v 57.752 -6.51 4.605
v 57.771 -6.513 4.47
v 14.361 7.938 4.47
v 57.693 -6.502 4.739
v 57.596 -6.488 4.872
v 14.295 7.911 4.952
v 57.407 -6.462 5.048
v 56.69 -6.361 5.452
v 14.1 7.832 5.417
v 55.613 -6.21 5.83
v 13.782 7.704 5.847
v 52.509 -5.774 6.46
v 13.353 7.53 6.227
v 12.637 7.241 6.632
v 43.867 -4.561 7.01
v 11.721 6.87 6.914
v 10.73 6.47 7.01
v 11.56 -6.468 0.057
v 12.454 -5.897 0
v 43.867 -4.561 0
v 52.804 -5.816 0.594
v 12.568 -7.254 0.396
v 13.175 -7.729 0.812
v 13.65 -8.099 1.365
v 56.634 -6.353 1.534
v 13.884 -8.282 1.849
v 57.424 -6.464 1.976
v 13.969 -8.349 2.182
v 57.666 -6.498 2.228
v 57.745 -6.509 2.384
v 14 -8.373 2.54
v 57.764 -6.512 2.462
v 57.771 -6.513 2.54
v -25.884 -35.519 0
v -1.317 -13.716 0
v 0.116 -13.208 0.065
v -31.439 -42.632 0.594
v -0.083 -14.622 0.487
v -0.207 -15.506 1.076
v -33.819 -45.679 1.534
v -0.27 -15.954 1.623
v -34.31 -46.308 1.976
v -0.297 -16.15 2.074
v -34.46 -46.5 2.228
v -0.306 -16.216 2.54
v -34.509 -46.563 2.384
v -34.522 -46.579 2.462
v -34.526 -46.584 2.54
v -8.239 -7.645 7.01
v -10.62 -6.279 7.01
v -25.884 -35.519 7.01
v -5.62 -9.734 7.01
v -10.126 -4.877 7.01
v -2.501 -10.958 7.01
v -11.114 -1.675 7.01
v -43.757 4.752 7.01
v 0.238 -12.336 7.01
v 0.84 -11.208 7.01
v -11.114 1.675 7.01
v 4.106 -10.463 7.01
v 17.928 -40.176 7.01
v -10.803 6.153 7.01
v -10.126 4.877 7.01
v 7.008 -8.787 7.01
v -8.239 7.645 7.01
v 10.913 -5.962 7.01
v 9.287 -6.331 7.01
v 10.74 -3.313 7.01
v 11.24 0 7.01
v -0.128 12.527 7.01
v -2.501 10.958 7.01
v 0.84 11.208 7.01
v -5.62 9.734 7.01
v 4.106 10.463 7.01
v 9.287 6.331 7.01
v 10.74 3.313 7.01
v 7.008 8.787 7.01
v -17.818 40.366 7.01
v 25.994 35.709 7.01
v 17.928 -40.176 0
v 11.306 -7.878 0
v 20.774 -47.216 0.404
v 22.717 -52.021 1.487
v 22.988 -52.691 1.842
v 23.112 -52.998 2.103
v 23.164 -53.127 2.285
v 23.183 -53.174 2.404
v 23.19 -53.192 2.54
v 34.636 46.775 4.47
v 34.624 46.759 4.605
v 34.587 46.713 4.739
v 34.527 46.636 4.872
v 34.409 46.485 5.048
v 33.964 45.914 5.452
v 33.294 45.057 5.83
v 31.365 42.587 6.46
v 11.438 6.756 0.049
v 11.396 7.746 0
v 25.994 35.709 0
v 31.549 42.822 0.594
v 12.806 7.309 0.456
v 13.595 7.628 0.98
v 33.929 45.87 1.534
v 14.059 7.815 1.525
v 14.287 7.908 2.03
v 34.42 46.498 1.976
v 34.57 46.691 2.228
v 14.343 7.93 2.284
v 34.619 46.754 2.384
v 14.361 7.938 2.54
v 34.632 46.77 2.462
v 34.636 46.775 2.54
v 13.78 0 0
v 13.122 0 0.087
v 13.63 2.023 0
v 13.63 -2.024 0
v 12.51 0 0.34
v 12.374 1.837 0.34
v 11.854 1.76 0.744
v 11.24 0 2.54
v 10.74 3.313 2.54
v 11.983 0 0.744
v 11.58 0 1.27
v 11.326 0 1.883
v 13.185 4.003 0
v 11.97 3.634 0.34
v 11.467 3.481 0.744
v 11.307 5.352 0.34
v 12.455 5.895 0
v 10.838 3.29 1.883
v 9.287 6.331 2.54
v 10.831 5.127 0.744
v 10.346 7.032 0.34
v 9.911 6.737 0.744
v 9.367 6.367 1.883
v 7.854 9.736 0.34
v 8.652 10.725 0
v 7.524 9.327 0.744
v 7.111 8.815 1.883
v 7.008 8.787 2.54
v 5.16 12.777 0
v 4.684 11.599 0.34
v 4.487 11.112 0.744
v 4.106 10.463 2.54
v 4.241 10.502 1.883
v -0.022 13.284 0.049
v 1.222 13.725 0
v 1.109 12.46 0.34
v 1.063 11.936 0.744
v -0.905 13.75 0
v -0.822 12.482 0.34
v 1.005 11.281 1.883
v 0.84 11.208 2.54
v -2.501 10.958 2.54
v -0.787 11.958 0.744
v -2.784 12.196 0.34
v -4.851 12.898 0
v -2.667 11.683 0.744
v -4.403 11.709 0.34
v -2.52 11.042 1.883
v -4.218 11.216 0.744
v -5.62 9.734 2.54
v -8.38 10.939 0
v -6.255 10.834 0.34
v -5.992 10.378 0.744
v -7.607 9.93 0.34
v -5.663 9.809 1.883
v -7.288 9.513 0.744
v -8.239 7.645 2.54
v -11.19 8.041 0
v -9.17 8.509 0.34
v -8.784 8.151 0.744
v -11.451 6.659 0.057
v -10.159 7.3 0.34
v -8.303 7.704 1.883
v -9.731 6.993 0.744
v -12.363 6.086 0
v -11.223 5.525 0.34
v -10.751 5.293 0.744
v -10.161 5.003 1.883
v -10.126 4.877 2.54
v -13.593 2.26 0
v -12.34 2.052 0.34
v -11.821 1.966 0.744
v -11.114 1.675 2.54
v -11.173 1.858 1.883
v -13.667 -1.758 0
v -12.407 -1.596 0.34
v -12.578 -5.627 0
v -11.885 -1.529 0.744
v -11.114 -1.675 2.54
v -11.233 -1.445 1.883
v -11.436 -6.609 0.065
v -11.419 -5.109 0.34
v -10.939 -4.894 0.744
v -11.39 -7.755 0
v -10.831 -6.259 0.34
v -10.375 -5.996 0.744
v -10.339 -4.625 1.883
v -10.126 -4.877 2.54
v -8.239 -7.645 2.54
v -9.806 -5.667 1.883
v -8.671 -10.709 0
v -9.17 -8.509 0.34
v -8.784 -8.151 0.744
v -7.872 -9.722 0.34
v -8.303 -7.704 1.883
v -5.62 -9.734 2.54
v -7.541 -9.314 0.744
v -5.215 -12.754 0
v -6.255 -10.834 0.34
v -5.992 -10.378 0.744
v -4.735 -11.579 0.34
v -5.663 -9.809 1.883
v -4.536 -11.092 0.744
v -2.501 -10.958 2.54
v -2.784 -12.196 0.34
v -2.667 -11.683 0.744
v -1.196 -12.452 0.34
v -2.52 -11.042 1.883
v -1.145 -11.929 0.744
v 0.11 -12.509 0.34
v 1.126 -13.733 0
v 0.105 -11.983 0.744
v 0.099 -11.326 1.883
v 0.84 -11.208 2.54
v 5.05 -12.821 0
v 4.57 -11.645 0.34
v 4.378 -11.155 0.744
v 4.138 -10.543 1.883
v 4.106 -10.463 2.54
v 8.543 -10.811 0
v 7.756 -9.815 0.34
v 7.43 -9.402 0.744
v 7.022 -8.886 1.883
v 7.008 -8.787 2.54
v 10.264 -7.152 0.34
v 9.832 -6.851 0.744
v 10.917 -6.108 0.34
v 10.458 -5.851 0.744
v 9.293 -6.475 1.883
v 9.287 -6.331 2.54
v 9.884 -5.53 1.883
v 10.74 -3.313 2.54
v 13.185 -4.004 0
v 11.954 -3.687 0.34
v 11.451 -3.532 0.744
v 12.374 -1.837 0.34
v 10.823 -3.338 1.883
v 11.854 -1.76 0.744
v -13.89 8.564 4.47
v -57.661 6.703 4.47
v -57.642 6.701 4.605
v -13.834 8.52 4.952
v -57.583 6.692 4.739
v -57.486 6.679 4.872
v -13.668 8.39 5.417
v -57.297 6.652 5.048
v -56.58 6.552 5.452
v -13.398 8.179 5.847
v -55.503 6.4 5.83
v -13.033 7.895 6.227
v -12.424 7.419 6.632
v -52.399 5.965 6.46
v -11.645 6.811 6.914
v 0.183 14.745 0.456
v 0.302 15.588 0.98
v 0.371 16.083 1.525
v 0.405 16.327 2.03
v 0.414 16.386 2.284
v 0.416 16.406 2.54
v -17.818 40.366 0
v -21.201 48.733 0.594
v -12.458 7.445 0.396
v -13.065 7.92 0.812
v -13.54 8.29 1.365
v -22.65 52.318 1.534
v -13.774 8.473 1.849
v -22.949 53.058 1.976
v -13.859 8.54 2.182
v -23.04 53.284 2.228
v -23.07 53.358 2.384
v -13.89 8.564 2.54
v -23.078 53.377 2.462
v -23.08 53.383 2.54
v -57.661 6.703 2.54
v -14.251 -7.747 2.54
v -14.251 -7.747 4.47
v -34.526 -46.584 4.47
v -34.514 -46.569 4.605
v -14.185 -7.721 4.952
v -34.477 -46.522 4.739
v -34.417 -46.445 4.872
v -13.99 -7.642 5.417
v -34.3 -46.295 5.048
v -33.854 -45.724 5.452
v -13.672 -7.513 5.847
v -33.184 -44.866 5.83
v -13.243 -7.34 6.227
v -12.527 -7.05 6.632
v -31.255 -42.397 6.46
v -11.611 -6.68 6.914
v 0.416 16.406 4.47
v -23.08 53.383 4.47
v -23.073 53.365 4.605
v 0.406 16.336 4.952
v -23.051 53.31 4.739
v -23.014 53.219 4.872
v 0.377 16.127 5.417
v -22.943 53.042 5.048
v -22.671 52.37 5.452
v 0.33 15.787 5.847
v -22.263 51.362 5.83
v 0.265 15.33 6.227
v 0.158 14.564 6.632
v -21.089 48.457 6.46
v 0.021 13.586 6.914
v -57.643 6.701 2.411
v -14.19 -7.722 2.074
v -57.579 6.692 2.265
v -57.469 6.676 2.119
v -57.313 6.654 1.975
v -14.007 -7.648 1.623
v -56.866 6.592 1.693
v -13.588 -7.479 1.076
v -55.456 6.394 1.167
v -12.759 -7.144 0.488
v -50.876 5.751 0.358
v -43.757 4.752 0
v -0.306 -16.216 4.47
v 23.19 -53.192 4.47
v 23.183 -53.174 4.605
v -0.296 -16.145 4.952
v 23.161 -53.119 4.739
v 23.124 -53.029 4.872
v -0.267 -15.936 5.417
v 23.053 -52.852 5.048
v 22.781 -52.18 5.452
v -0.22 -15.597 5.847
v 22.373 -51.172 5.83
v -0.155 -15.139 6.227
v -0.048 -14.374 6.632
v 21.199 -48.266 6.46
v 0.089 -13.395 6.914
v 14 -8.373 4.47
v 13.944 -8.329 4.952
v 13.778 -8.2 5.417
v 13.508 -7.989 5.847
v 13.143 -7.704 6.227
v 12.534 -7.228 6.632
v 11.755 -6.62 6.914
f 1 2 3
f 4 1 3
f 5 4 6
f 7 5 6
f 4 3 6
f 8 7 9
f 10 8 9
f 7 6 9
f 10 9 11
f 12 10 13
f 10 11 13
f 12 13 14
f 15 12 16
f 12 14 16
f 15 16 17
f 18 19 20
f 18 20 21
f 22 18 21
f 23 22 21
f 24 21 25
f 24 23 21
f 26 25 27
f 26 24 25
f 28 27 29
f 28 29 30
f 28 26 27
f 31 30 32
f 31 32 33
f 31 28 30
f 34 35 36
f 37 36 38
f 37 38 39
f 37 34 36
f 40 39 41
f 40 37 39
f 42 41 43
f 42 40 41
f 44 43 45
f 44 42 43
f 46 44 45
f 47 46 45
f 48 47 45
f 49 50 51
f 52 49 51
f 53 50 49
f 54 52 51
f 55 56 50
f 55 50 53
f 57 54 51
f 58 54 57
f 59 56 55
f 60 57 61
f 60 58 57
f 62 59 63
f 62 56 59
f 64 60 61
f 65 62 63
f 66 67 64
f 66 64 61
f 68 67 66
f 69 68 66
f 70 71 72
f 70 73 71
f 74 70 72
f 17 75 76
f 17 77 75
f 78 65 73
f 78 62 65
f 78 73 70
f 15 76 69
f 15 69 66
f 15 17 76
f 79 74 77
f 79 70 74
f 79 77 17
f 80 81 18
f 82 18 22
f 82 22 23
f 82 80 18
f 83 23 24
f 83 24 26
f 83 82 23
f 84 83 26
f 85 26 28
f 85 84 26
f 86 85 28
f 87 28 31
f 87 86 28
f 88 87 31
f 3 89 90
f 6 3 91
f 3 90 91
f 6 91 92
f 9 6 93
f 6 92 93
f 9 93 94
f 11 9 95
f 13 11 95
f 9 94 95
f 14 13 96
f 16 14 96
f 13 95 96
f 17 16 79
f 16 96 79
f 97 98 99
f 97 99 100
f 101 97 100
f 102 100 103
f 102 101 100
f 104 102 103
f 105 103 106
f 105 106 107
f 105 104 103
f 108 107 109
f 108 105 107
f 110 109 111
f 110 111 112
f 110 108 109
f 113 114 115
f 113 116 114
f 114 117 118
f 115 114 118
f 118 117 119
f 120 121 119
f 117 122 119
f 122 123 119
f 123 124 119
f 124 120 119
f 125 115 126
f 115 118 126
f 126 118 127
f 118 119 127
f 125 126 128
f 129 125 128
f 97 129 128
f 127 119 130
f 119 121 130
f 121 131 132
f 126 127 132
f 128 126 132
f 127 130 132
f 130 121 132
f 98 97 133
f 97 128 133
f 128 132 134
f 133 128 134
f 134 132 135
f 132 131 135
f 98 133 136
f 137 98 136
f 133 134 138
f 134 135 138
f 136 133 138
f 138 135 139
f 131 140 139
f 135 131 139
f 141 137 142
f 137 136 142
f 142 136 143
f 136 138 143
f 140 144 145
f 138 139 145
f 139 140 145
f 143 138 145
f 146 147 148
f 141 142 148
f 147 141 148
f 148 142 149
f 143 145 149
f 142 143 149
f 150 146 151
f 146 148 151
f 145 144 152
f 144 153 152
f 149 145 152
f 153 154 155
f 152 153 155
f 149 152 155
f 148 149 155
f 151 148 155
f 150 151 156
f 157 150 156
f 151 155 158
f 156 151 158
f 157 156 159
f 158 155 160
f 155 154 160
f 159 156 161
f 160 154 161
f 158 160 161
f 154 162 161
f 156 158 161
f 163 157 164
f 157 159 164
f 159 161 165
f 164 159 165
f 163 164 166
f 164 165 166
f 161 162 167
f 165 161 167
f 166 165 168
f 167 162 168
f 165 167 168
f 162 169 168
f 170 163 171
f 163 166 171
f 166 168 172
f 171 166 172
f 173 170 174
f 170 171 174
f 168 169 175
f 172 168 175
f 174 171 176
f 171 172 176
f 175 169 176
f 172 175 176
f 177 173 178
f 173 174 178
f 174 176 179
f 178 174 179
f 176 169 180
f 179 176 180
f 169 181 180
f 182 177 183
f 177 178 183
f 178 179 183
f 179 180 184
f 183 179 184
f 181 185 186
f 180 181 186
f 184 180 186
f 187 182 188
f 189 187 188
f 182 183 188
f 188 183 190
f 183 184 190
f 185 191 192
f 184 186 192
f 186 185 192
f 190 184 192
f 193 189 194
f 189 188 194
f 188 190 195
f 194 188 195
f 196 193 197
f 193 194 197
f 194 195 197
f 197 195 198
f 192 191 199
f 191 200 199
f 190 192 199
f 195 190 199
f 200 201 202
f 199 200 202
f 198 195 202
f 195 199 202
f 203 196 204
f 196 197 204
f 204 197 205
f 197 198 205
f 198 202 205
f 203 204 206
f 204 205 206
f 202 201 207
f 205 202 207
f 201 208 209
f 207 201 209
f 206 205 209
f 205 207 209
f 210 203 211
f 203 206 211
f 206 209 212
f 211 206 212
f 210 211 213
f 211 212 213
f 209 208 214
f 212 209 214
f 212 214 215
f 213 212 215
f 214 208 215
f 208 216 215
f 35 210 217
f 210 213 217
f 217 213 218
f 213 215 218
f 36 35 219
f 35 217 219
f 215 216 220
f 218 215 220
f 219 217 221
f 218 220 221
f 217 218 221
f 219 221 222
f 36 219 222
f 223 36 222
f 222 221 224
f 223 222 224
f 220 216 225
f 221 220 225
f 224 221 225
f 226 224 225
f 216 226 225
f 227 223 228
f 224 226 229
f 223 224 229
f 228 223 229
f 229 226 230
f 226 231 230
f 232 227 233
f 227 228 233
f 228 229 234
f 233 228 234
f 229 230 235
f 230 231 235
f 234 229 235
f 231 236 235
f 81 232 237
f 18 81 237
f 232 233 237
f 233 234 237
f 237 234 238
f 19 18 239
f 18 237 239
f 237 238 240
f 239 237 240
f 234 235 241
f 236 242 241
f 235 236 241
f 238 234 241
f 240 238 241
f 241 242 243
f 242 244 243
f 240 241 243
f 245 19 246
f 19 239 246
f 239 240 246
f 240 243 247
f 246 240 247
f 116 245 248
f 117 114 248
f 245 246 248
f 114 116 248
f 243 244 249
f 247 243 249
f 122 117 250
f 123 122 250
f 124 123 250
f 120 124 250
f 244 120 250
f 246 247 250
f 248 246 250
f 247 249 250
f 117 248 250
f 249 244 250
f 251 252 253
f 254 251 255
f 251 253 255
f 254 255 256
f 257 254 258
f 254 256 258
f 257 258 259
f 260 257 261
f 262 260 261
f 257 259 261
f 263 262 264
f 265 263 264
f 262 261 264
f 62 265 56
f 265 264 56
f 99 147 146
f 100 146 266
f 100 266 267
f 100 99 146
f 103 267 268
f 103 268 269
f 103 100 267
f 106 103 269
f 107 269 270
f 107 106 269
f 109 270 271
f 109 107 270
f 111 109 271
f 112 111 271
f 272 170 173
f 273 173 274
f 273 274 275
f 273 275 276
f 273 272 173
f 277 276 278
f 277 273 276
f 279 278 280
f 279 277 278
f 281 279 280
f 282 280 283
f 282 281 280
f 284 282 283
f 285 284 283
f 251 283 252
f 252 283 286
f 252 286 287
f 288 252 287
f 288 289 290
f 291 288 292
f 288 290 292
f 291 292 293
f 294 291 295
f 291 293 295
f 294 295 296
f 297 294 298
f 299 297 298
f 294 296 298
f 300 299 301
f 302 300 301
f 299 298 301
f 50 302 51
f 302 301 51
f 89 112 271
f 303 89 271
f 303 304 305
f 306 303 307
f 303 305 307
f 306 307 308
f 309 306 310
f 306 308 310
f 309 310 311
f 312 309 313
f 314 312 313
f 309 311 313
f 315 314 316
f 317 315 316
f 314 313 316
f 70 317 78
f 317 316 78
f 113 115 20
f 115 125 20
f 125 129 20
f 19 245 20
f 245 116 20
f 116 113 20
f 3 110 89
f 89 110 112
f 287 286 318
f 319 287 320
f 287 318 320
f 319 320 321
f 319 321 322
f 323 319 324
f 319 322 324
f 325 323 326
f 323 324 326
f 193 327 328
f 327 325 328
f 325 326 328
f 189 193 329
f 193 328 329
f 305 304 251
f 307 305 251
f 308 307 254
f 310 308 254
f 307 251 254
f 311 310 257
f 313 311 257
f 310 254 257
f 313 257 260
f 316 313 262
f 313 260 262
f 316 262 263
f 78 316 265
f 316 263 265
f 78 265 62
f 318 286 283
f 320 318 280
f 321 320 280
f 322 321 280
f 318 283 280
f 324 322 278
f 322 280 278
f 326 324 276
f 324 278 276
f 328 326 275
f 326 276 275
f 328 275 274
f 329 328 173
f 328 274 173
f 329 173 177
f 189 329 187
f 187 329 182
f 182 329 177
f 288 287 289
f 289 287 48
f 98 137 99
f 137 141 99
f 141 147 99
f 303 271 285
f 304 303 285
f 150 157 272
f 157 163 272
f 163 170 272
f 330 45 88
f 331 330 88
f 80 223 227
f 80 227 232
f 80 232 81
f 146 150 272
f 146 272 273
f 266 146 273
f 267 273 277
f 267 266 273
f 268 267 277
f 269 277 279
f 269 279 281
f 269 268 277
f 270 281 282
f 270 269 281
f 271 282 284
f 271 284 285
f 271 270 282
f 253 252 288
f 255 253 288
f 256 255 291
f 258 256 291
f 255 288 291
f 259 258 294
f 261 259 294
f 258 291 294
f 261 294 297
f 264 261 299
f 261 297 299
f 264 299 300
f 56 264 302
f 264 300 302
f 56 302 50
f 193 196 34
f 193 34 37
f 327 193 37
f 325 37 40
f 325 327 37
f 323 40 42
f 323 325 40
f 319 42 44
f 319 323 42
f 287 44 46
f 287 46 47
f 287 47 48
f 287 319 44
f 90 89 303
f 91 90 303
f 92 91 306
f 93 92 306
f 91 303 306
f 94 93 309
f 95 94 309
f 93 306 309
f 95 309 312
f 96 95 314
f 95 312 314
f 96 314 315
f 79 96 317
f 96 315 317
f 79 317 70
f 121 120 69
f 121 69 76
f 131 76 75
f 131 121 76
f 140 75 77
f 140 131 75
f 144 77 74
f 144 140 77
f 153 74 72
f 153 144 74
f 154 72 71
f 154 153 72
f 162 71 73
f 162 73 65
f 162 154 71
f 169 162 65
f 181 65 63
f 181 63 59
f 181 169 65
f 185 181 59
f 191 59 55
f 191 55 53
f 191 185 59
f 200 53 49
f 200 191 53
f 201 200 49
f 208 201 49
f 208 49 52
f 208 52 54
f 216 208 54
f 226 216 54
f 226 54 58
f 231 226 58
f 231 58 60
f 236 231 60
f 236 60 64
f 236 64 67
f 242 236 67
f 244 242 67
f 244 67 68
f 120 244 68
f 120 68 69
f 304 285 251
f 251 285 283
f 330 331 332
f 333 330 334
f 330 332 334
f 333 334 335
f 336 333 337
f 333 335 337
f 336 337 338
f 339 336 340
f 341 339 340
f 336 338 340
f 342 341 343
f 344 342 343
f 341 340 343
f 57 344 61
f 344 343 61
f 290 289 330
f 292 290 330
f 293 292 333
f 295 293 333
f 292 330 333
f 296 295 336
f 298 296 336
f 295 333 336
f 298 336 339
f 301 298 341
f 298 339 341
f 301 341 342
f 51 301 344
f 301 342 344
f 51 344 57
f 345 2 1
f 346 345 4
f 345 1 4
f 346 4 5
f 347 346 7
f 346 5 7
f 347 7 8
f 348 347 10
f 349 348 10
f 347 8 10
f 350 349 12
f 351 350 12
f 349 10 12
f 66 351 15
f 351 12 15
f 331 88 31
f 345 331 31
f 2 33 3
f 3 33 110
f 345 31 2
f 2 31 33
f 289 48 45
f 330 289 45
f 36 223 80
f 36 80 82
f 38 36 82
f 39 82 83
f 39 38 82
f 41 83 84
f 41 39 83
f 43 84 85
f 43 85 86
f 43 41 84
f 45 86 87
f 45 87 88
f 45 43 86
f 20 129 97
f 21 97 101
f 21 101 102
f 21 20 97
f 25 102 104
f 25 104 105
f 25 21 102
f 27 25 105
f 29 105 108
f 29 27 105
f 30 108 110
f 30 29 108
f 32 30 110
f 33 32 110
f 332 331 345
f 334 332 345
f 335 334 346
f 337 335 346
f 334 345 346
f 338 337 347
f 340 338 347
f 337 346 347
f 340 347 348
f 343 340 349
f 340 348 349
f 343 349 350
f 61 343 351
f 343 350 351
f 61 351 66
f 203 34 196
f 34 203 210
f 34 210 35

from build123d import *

# Parameters (mm, degrees)
F0_R          = 11.2395
F1_DEPTH      = 7.0104
F2_R          = 2.54
F3_T4_DEPTH   = 58.4517099093
F3_T9_DEPTH   = 56.5105690907
F3_T14_DEPTH  = 58.4517099093
F3_T19_DEPTH  = 56.5105690907
F3_T24_DEPTH  = 58.4517099093
F3_T29_DEPTH  = 56.5105690907
F3_T34_DEPTH  = 58.4517099093
F3_T39_DEPTH  = 56.5105690907
F3_T44_DEPTH  = 58.4517099093
F3_T49_DEPTH  = 56.5105690907
F3_T54_DEPTH  = 58.4517099093
F3_T59_DEPTH  = 56.5105690907
F3_T67_DEPTH  = 58.4517099093
F3_T71_DEPTH  = 56.5105690907
F3_T78_DEPTH  = 58.4517099093
F3_T82_DEPTH  = 56.5105690907
F3_T89_DEPTH  = 58.4517099093
F3_T93_DEPTH  = 56.5105690907
F3_T100_DEPTH = 58.4517099093
F3_T104_DEPTH = 56.5105690907
F3_T111_DEPTH = 58.4517099093
F3_T115_DEPTH = 56.5105690907
F3_T122_DEPTH = 56.5105690907
F3_T126_DEPTH = 58.4517099093


# Not quite as in the source:
# - a fillet or chamfer that OpenCascade refuses, or shapes differently, is made with other operations: its cross-section is extruded or revolved along the edge and cut away or added


with BuildPart() as f1:
    # F0 (on Top) → F1 (new body)
    with BuildSketch(Plane.XY):
        with BuildLine():
            ThreePointArc((14.1535943712, 7.539855096), (15.5587542777, 3.8857192152), (16.036634575, 0))
            ThreePointArc((16.036634575, 0), (15.49765005, -4.122680126), (13.91692656, -7.9682371712))
            Line((13.91692656, -7.9682371712), (13.9999523741, -8.373134936))
            Line((13.9999523741, -8.373134936), (57.7710043319, -6.5127654675))
            Line((57.7710043319, -6.5127654675), (14.3613089772, 7.9377469398))
            Line((14.3613089772, 7.9377469398), (14.1535943712, 7.539855096))
        make_face()
        with BuildLine():
            ThreePointArc((0, 16.036634575), (8.2540822497, 13.7493190635), (14.1535943712, 7.539855096))
            Line((14.1535943712, 7.539855096), (14.3613089772, 7.9377469398))
            Line((14.3613089772, 7.9377469398), (34.635707736, 46.7747746198))
            Line((34.635707736, 46.7747746198), (0.4163492162, 16.4061318757))
            Line((0.4163492162, 16.4061318757), (0, 16.036634575))
        make_face()
        with BuildLine():
            Line((13.9999523741, -8.373134936), (13.91692656, -7.9682371712))
            ThreePointArc((13.91692656, -7.9682371712), (13.7943089537, -8.1786728131), (13.6685096291, -8.387222008))
            Line((13.6685096291, -8.387222008), (13.9999523741, -8.373134936))
        make_face()
        with BuildLine():
            ThreePointArc((-13.549530457, 8.5781042712), (-7.7333603611, 14.048800163), (0, 16.036634575))
            Line((0, 16.036634575), (0.4163492162, 16.4061318757))
            Line((0.4163492162, 16.4061318757), (-23.0803039828, 53.3827900874))
            Line((-23.0803039828, 53.3827900874), (-13.8899671478, 8.563634936))
            Line((-13.8899671478, 8.563634936), (-13.549530457, 8.5781042712))
        make_face()
        with BuildLine():
            Line((13.9999523741, -8.373134936), (13.6685096291, -8.387222008))
            ThreePointArc((13.6685096291, -8.387222008), (7.7861485351, -14.0196126723), (-0.1042878985, -16.036295474))
            Line((-0.1042878985, -16.036295474), (-0.30636399, -16.2156318757))
            Line((-0.30636399, -16.2156318757), (23.190289209, -53.1922900874))
            Line((23.190289209, -53.1922900874), (13.9999523741, -8.373134936))
        make_face()
        with BuildLine():
            ThreePointArc((-13.8067270062, 8.157691945), (-13.6797438656, 8.3688862021), (-13.549530457, 8.5781042712))
            Line((-13.549530457, 8.5781042712), (-13.8899671478, 8.563634936))
            Line((-13.8899671478, 8.563634936), (-13.8067270062, 8.157691945))
        make_face()
        with BuildLine():
            Line((-0.30636399, -16.2156318757), (-0.1042878985, -16.036295474))
            ThreePointArc((-0.1042878985, -16.036295474), (-0.2639889319, -16.0344615855), (-0.4236637816, -16.0310373181))
            Line((-0.4236637816, -16.0310373181), (-0.30636399, -16.2156318757))
        make_face()
        with BuildLine():
            ThreePointArc((-14.1482702845, -7.5498408229), (-16.0328448753, 0.3486168375), (-13.8067270062, 8.157691945))
            Line((-13.8067270062, 8.157691945), (-13.8899671478, 8.563634936))
            Line((-13.8899671478, 8.563634936), (-57.6610191056, 6.7032654675))
            Line((-57.6610191056, 6.7032654675), (-14.2513237509, -7.7472469398))
            Line((-14.2513237509, -7.7472469398), (-14.1482702845, -7.5498408229))
        make_face()
        with BuildLine():
            Line((-0.30636399, -16.2156318757), (-0.4236637816, -16.0310373181))
            ThreePointArc((-0.4236637816, -16.0310373181), (-8.2924525996, -13.7262113628), (-13.9934373276, -7.8330939131))
            Line((-13.9934373276, -7.8330939131), (-14.2513237509, -7.7472469398))
            Line((-14.2513237509, -7.7472469398), (-34.5257225097, -46.5842746198))
            Line((-34.5257225097, -46.5842746198), (-0.30636399, -16.2156318757))
        make_face()
        with BuildLine():
            ThreePointArc((-13.9934373276, -7.8330939131), (-14.0715665407, -7.6918569659), (-14.1482702845, -7.5498408229))
            Line((-14.1482702845, -7.5498408229), (-14.2513237509, -7.7472469398))
            Line((-14.2513237509, -7.7472469398), (-13.9934373276, -7.8330939131))
        make_face()
        with BuildLine():
            ThreePointArc((13.91692656, -7.9682371712), (15.49765005, -4.122680126), (16.036634575, 0))
            ThreePointArc((16.036634575, 0), (15.5587542777, 3.8857192152), (14.1535943712, 7.539855096))
            ThreePointArc((14.1535943712, 7.539855096), (8.2540822497, 13.7493190635), (0, 16.036634575))
            ThreePointArc((0, 16.036634575), (-7.7333603611, 14.048800163), (-13.549530457, 8.5781042712))
            ThreePointArc((-13.549530457, 8.5781042712), (-13.6797438656, 8.3688862021), (-13.8067270062, 8.157691945))
            ThreePointArc((-13.8067270062, 8.157691945), (-16.0328448753, 0.3486168375), (-14.1482702845, -7.5498408229))
            ThreePointArc((-14.1482702845, -7.5498408229), (-14.0715665407, -7.6918569659), (-13.9934373276, -7.8330939131))
            ThreePointArc((-13.9934373276, -7.8330939131), (-8.2924525996, -13.7262113628), (-0.4236637816, -16.0310373181))
            ThreePointArc((-0.4236637816, -16.0310373181), (-0.2639889319, -16.0344615855), (-0.1042878985, -16.036295474))
            ThreePointArc((-0.1042878985, -16.036295474), (7.7861485351, -14.0196126723), (13.6685096291, -8.387222008))
            ThreePointArc((13.6685096291, -8.387222008), (13.7943089537, -8.1786728131), (13.91692656, -7.9682371712))
        make_face()
        Circle(F0_R, mode=Mode.SUBTRACT)
    extrude(amount=F1_DEPTH)

    # F2
    f2_edges = [f1.edges().sort_by_distance(p)[0] for p in [
        (36.066157, 0.712491, 7.0104),
        (24.498508, 27.356261, 7.0104),
        (17.526028, 31.590453, 7.0104),
        (-11.331977, 34.894461, 7.0104),
        (-18.485136, 30.973213, 7.0104),
        (-35.775493, 7.63345, 7.0104),
        (-35.956171, -0.521991, 7.0104),
        (-24.388523, -27.165761, 7.0104),
        (-17.416043, -31.399953, 7.0104),
        (11.441963, -34.703961, 7.0104),
        (18.595121, -30.782713, 7.0104),
        (35.885478, -7.44295, 7.0104),
    ]]
    fillet(f2_edges, radius=F2_R)

    # F3: fillet of radius 2.54 on 13 edges, made by hand


with BuildPart() as f3_tool2:
    # F3_s3 → F3_t4 (new body)
    with BuildSketch(Plane(origin=(-59.9425858258, 19.9540925852, 0), x_dir=(0, 0, 1), z_dir=(0.9488103383, -0.3158463899, 0))):
        with BuildLine():
            ThreePointArc((2.54, 11.8518971477), (0.7439487758, 11.1079483719), (0, 9.3118971477))
            Line((0, 9.3118971477), (0, 11.8518971477))
            Line((0, 11.8518971477), (2.54, 11.8518971477))
        make_face()
    extrude(amount=F3_T4_DEPTH)

    split(bisect_by=Plane(origin=(-8.0210442823, 4.1872887797, 0), x_dir=(0, 0, 1), z_dir=(-0.8864762199, 0.4627741474, 0)), keep=Keep.TOP)


with BuildPart() as f1_1:
    add(f1.part)

    # F3_t1: cut F3_tool2
    add(f3_tool2.part, mode=Mode.SUBTRACT)


with BuildPart() as f3_tool7:
    # F3_s8 → F3_t9 (new body)
    with BuildSketch(Plane(origin=(-3.2916636325, -6.305411723, 0), x_dir=(0, 0, 1), z_dir=(-0.4627741474, -0.8864762199, 0))):
        with BuildLine():
            ThreePointArc((0, 6.5082340102), (0.7439487758, 8.3042852344), (2.54, 9.0482340102))
            Line((2.54, 9.0482340102), (0, 9.0482340102))
            Line((0, 9.0482340102), (0, 6.5082340102))
        make_face()
    extrude(amount=F3_T9_DEPTH)

    split(bisect_by=Plane(origin=(-3.7433789278, -11.2452025417, 0), x_dir=(0, 0, 1), z_dir=(-0.3158463899, -0.9488103383, 0)), keep=Keep.TOP)


with BuildPart() as f1_2:
    add(f1_1.part)

    # F3_t6: cut F3_tool7
    add(f3_tool7.part, mode=Mode.SUBTRACT)


with BuildPart() as f3_tool12:
    # F3_s13 → F3_t14 (new body)
    with BuildSketch(Plane(origin=(-47.1905173297, -41.8801527464, 0), x_dir=(0, 0, 1), z_dir=(0.7479361665, 0.6637706613, 0))):
        with BuildLine():
            ThreePointArc((0, 9.3849021141), (0.7439487758, 11.1809533383), (2.54, 11.9249021141))
            Line((2.54, 11.9249021141), (0, 11.9249021141))
            Line((0, 11.9249021141), (0, 9.3849021141))
        make_face()
    extrude(amount=F3_T14_DEPTH)

    split(bisect_by=Plane(origin=(-7.5584718817, -4.8029973802, 0), x_dir=(0, 0, 1), z_dir=(-0.8440122778, -0.5363238526, 0)), keep=Keep.TOP)


with BuildPart() as f1_3:
    add(f1_2.part)

    # F3_t11: cut F3_tool12
    add(f3_tool12.part, mode=Mode.SUBTRACT)


with BuildPart() as f3_tool17:
    # F3_s18 → F3_t19 (new body)
    with BuildSketch(Plane(origin=(3.8464514278, -6.0531565313, 0), x_dir=(0, 0, 1), z_dir=(0.5363238526, -0.8440122778, 0))):
        with BuildLine():
            ThreePointArc((0, 6.4154051288), (0.7439487758, 8.211456353), (2.54, 8.9554051288))
            Line((2.54, 8.9554051288), (0, 8.9554051288))
            Line((0, 8.9554051288), (0, 6.4154051288))
        make_face()
    extrude(amount=F3_T19_DEPTH)

    split(bisect_by=Plane(origin=(7.9154001627, -8.9190655729, 0), x_dir=(0, 0, 1), z_dir=(0.6637706613, -0.7479361665, 0)), keep=Keep.TOP)


with BuildPart() as f1_4:
    add(f1_3.part)

    # F3_t16: cut F3_tool17
    add(f3_tool17.part, mode=Mode.SUBTRACT)


with BuildPart() as f3_tool22:
    # F3_s23 → F3_t24 (new body)
    with BuildSketch(Plane(origin=(12.6784554794, -61.8299060653, 0), x_dir=(0, 0, 1), z_dir=(-0.2008741718, 0.9796170513, 0))):
        with BuildLine():
            ThreePointArc((0, 9.4926455171), (0.7439487758, 11.2886967414), (2.54, 12.0326455171))
            Line((2.54, 12.0326455171), (0, 12.0326455171))
            Line((0, 12.0326455171), (0, 9.4926455171))
        make_face()
    extrude(amount=F3_T24_DEPTH)

    split(bisect_by=Plane(origin=(0.3804801286, -8.9519935471, 0), x_dir=(0, 0, 1), z_dir=(0.0424639421, -0.999098, 0)), keep=Keep.TOP)


with BuildPart() as f1_5:
    add(f1_4.part)

    # F3_t21: cut F3_tool22
    add(f3_tool22.part, mode=Mode.SUBTRACT)


with BuildPart() as f3_tool27:
    # F3_s28 → F3_t29 (new body)
    with BuildSketch(Plane(origin=(7.2751999455, 0.3092125789, 0), x_dir=(0, 0, 1), z_dir=(0.999098, 0.0424639421, 0))):
        with BuildLine():
            ThreePointArc((0, 6.4200755351), (0.7439487758, 8.2161267593), (2.54, 8.9600755351))
            Line((2.54, 8.9600755351), (0, 8.9600755351))
            Line((0, 8.9600755351), (0, 6.4200755351))
        make_face()
    extrude(amount=F3_T29_DEPTH)

    split(bisect_by=Plane(origin=(11.7873847203, 2.4170477024, 0), x_dir=(0, 0, 1), z_dir=(0.9796170513, 0.2008741718, 0)), keep=Keep.TOP)


with BuildPart() as f1_6:
    add(f1_5.part)

    # F3_t26: cut F3_tool27
    add(f3_tool27.part, mode=Mode.SUBTRACT)


with BuildPart() as f3_tool32:
    # F3_s33 → F3_t34 (new body)
    with BuildSketch(Plane(origin=(59.9845103223, -19.9680486945, 0), x_dir=(0, 0, 1), z_dir=(-0.9488103383, 0.3158463899, 0))):
        with BuildLine():
            ThreePointArc((0, 9.5273839538), (0.7439487758, 11.323435178), (2.54, 12.0673839538))
            Line((2.54, 12.0673839538), (0, 12.0673839538))
            Line((0, 12.0673839538), (0, 9.5273839538))
        make_face()
    extrude(amount=F3_T34_DEPTH)

    split(bisect_by=Plane(origin=(8.0293246905, -4.1916114663, 0), x_dir=(0, 0, 1), z_dir=(0.8864762199, -0.4627741474, 0)), keep=Keep.TOP)


with BuildPart() as f1_7:
    add(f1_6.part)

    # F3_t31: cut F3_tool32
    add(f3_tool32.part, mode=Mode.SUBTRACT)


with BuildPart() as f3_tool37:
    # F3_s38 → F3_t39 (new body)
    with BuildSketch(Plane(origin=(3.3933684506, 6.5002344095, 0), x_dir=(0, 0, 1), z_dir=(0.4627741474, 0.8864762199, 0))):
        with BuildLine():
            ThreePointArc((0, 6.5175748228), (0.7439487758, 8.313626047), (2.54, 9.0575748228))
            Line((2.54, 9.0575748228), (0, 9.0575748228))
            Line((0, 9.0575748228), (0, 6.5175748228))
        make_face()
    extrude(amount=F3_T39_DEPTH)

    split(bisect_by=Plane(origin=(3.8114396575, 11.449658651, 0), x_dir=(0, 0, 1), z_dir=(0.3158463899, 0.9488103383, 0)), keep=Keep.TOP)


with BuildPart() as f1_8:
    add(f1_7.part)

    # F3_t36: cut F3_tool37
    add(f3_tool37.part, mode=Mode.SUBTRACT)


with BuildPart() as f3_tool42:
    # F3_s43 → F3_t44 (new body)
    with BuildSketch(Plane(origin=(47.3466192661, 42.0186884801, 0), x_dir=(0, 0, 1), z_dir=(-0.7479361665, -0.6637706613, 0))):
        with BuildLine():
            ThreePointArc((0, 9.4543789874), (0.7439487758, 11.2504302116), (2.54, 11.9943789874))
            Line((2.54, 11.9943789874), (0, 11.9943789874))
            Line((0, 11.9943789874), (0, 9.4543789874))
        make_face()
    extrude(amount=F3_T44_DEPTH)

    split(bisect_by=Plane(origin=(7.7230530734, 4.9075797674, 0), x_dir=(0, 0, 1), z_dir=(0.8440122778, 0.5363238526, 0)), keep=Keep.TOP)


with BuildPart() as f1_9:
    add(f1_8.part)

    # F3_t41: cut F3_tool42
    add(f3_tool42.part, mode=Mode.SUBTRACT)


with BuildPart() as f3_tool47:
    # F3_s48 → F3_t49 (new body)
    with BuildSketch(Plane(origin=(-3.9010473932, 6.1390741441, 0), x_dir=(0, 0, 1), z_dir=(-0.5363238526, 0.8440122778, 0))):
        with BuildLine():
            ThreePointArc((0, 6.6104037041), (0.7439487758, 8.4064549283), (2.54, 9.1504037041))
            Line((2.54, 9.1504037041), (0, 9.1504037041))
            Line((0, 9.1504037041), (0, 6.6104037041))
        make_face()
    extrude(amount=F3_T49_DEPTH)

    split(bisect_by=Plane(origin=(-7.9615168729, 8.9710298392, 0), x_dir=(0, 0, 1), z_dir=(-0.6637706613, 0.7479361665, 0)), keep=Keep.TOP)


with BuildPart() as f1_10:
    add(f1_9.part)

    # F3_t46: cut F3_tool47
    add(f3_tool47.part, mode=Mode.SUBTRACT)


with BuildPart() as f3_tool52:
    # F3_s53 → F3_t54 (new body)
    with BuildSketch(Plane(origin=(-12.7115040729, 61.9910764409, 0), x_dir=(0, 0, 1), z_dir=(0.2008741718, -0.9796170513, 0))):
        with BuildLine():
            ThreePointArc((0, 9.3466355844), (0.7439487758, 11.1426868086), (2.54, 11.8866355844))
            Line((2.54, 11.8866355844), (0, 11.8866355844))
            Line((0, 11.8866355844), (0, 9.3466355844))
        make_face()
    extrude(amount=F3_T54_DEPTH)

    split(bisect_by=Plane(origin=(-0.3883638891, 9.1374838465, 0), x_dir=(0, 0, 1), z_dir=(-0.0424639421, 0.999098, 0)), keep=Keep.TOP)


with BuildPart() as f1_11:
    add(f1_10.part)

    # F3_t51: cut F3_tool52
    add(f3_tool52.part, mode=Mode.SUBTRACT)


with BuildPart() as f3_tool57:
    # F3_s58 → F3_t59 (new body)
    with BuildSketch(Plane(origin=(-7.1573309587, -0.3042028783, 0), x_dir=(0, 0, 1), z_dir=(-0.999098, -0.0424639421, 0))):
        with BuildLine():
            ThreePointArc((2.54, 9.1457332978), (0.7439487758, 8.4017845221), (0, 6.6057332978))
            Line((0, 6.6057332978), (0, 9.1457332978))
            Line((0, 9.1457332978), (2.54, 9.1457332978))
        make_face()
    extrude(amount=F3_T59_DEPTH)

    split(bisect_by=Plane(origin=(-11.6443509005, -2.3877180781, 0), x_dir=(0, 0, 1), z_dir=(-0.9796170513, -0.2008741718, 0)), keep=Keep.TOP)


with BuildPart() as f1_12:
    add(f1_11.part)

    # F3_t56: cut F3_tool57
    add(f3_tool57.part, mode=Mode.SUBTRACT)

    # F3_s61 → F3_t62 (revolve, cut)
    with BuildSketch(Plane.XZ):
        with BuildLine():
            ThreePointArc((13.7795, 0), (11.9834487758, 0.7439487758), (11.2395, 2.54))
            Line((11.2395, 2.54), (11.2395, 0))
            Line((11.2395, 0), (13.7795, 0))
        make_face()
    revolve(axis=Axis((0, 0, 0), (0, 0, 1)), mode=Mode.SUBTRACT)


with BuildPart() as f3_tool65:
    # F3_s66 → F3_t67 (new body)
    with BuildSketch(Plane(origin=(-59.9425858258, 19.9540925852, 0), x_dir=(0, 0, 1), z_dir=(0.9488103383, -0.3158463899, 0))):
        with BuildLine():
            ThreePointArc((2.54, 11.8518971477), (0.7439487758, 11.1079483719), (0, 9.3118971477))
            Line((0, 9.3118971477), (0, 11.8518971477))
            Line((0, 11.8518971477), (2.54, 11.8518971477))
        make_face()
    extrude(amount=F3_T67_DEPTH)

    split(bisect_by=Plane(origin=(-8.0210442823, 4.1872887797, 0), x_dir=(0, 0, 1), z_dir=(0.8864762199, -0.4627741474, 0)), keep=Keep.TOP)


with BuildPart() as f3_tool69:
    # F3_s70 → F3_t71 (new body)
    with BuildSketch(Plane(origin=(-3.2916636325, -6.305411723, 0), x_dir=(0, 0, 1), z_dir=(-0.4627741474, -0.8864762199, 0))):
        with BuildLine():
            ThreePointArc((0, 6.5082340102), (0.7439487758, 8.3042852344), (2.54, 9.0482340102))
            Line((2.54, 9.0482340102), (0, 9.0482340102))
            Line((0, 9.0482340102), (0, 6.5082340102))
        make_face()
    extrude(amount=F3_T71_DEPTH)

    split(bisect_by=Plane(origin=(-3.7433789278, -11.2452025417, 0), x_dir=(0, 0, 1), z_dir=(0.3158463899, 0.9488103383, 0)), keep=Keep.TOP)


with BuildPart() as f3_tool65_1:
    add(f3_tool65.part)

    # F3_t73: intersect F3_tool69
    add(f3_tool69.part, mode=Mode.INTERSECT)


with BuildPart() as f1_13:
    add(f1_12.part)

    # F3_t63: cut F3_tool65
    add(f3_tool65_1.part, mode=Mode.SUBTRACT)


with BuildPart() as f3_tool76:
    # F3_s77 → F3_t78 (new body)
    with BuildSketch(Plane(origin=(-47.1905173297, -41.8801527464, 0), x_dir=(0, 0, 1), z_dir=(0.7479361665, 0.6637706613, 0))):
        with BuildLine():
            ThreePointArc((0, 9.3849021141), (0.7439487758, 11.1809533383), (2.54, 11.9249021141))
            Line((2.54, 11.9249021141), (0, 11.9249021141))
            Line((0, 11.9249021141), (0, 9.3849021141))
        make_face()
    extrude(amount=F3_T78_DEPTH)

    split(bisect_by=Plane(origin=(-7.5584718817, -4.8029973802, 0), x_dir=(0, 0, 1), z_dir=(0.8440122778, 0.5363238526, 0)), keep=Keep.TOP)


with BuildPart() as f3_tool80:
    # F3_s81 → F3_t82 (new body)
    with BuildSketch(Plane(origin=(3.8464514278, -6.0531565313, 0), x_dir=(0, 0, 1), z_dir=(0.5363238526, -0.8440122778, 0))):
        with BuildLine():
            ThreePointArc((0, 6.4154051288), (0.7439487758, 8.211456353), (2.54, 8.9554051288))
            Line((2.54, 8.9554051288), (0, 8.9554051288))
            Line((0, 8.9554051288), (0, 6.4154051288))
        make_face()
    extrude(amount=F3_T82_DEPTH)

    split(bisect_by=Plane(origin=(7.9154001627, -8.9190655729, 0), x_dir=(0, 0, 1), z_dir=(-0.6637706613, 0.7479361665, 0)), keep=Keep.TOP)


with BuildPart() as f3_tool76_1:
    add(f3_tool76.part)

    # F3_t84: intersect F3_tool80
    add(f3_tool80.part, mode=Mode.INTERSECT)


with BuildPart() as f1_14:
    add(f1_13.part)

    # F3_t74: cut F3_tool76
    add(f3_tool76_1.part, mode=Mode.SUBTRACT)


with BuildPart() as f3_tool87:
    # F3_s88 → F3_t89 (new body)
    with BuildSketch(Plane(origin=(12.6784554794, -61.8299060653, 0), x_dir=(0, 0, 1), z_dir=(-0.2008741718, 0.9796170513, 0))):
        with BuildLine():
            ThreePointArc((0, 9.4926455171), (0.7439487758, 11.2886967414), (2.54, 12.0326455171))
            Line((2.54, 12.0326455171), (0, 12.0326455171))
            Line((0, 12.0326455171), (0, 9.4926455171))
        make_face()
    extrude(amount=F3_T89_DEPTH)

    split(bisect_by=Plane(origin=(0.3804801286, -8.9519935471, 0), x_dir=(0, 0, 1), z_dir=(-0.0424639421, 0.999098, 0)), keep=Keep.TOP)


with BuildPart() as f3_tool91:
    # F3_s92 → F3_t93 (new body)
    with BuildSketch(Plane(origin=(7.2751999455, 0.3092125789, 0), x_dir=(0, 0, 1), z_dir=(0.999098, 0.0424639421, 0))):
        with BuildLine():
            ThreePointArc((0, 6.4200755351), (0.7439487758, 8.2161267593), (2.54, 8.9600755351))
            Line((2.54, 8.9600755351), (0, 8.9600755351))
            Line((0, 8.9600755351), (0, 6.4200755351))
        make_face()
    extrude(amount=F3_T93_DEPTH)

    split(bisect_by=Plane(origin=(11.7873847203, 2.4170477024, 0), x_dir=(0, 0, 1), z_dir=(-0.9796170513, -0.2008741718, 0)), keep=Keep.TOP)


with BuildPart() as f3_tool87_1:
    add(f3_tool87.part)

    # F3_t95: intersect F3_tool91
    add(f3_tool91.part, mode=Mode.INTERSECT)


with BuildPart() as f1_15:
    add(f1_14.part)

    # F3_t85: cut F3_tool87
    add(f3_tool87_1.part, mode=Mode.SUBTRACT)


with BuildPart() as f3_tool98:
    # F3_s99 → F3_t100 (new body)
    with BuildSketch(Plane(origin=(59.9845103223, -19.9680486945, 0), x_dir=(0, 0, 1), z_dir=(-0.9488103383, 0.3158463899, 0))):
        with BuildLine():
            ThreePointArc((0, 9.5273839538), (0.7439487758, 11.323435178), (2.54, 12.0673839538))
            Line((2.54, 12.0673839538), (0, 12.0673839538))
            Line((0, 12.0673839538), (0, 9.5273839538))
        make_face()
    extrude(amount=F3_T100_DEPTH)

    split(bisect_by=Plane(origin=(8.0293246905, -4.1916114663, 0), x_dir=(0, 0, 1), z_dir=(-0.8864762199, 0.4627741474, 0)), keep=Keep.TOP)


with BuildPart() as f3_tool102:
    # F3_s103 → F3_t104 (new body)
    with BuildSketch(Plane(origin=(3.3933684506, 6.5002344095, 0), x_dir=(0, 0, 1), z_dir=(0.4627741474, 0.8864762199, 0))):
        with BuildLine():
            ThreePointArc((0, 6.5175748228), (0.7439487758, 8.313626047), (2.54, 9.0575748228))
            Line((2.54, 9.0575748228), (0, 9.0575748228))
            Line((0, 9.0575748228), (0, 6.5175748228))
        make_face()
    extrude(amount=F3_T104_DEPTH)

    split(bisect_by=Plane(origin=(3.8114396575, 11.449658651, 0), x_dir=(0, 0, 1), z_dir=(-0.3158463899, -0.9488103383, 0)), keep=Keep.TOP)


with BuildPart() as f3_tool98_1:
    add(f3_tool98.part)

    # F3_t106: intersect F3_tool102
    add(f3_tool102.part, mode=Mode.INTERSECT)


with BuildPart() as f1_16:
    add(f1_15.part)

    # F3_t96: cut F3_tool98
    add(f3_tool98_1.part, mode=Mode.SUBTRACT)


with BuildPart() as f3_tool109:
    # F3_s110 → F3_t111 (new body)
    with BuildSketch(Plane(origin=(47.3466192661, 42.0186884801, 0), x_dir=(0, 0, 1), z_dir=(-0.7479361665, -0.6637706613, 0))):
        with BuildLine():
            ThreePointArc((0, 9.4543789874), (0.7439487758, 11.2504302116), (2.54, 11.9943789874))
            Line((2.54, 11.9943789874), (0, 11.9943789874))
            Line((0, 11.9943789874), (0, 9.4543789874))
        make_face()
    extrude(amount=F3_T111_DEPTH)

    split(bisect_by=Plane(origin=(7.7230530734, 4.9075797674, 0), x_dir=(0, 0, 1), z_dir=(-0.8440122778, -0.5363238526, 0)), keep=Keep.TOP)


with BuildPart() as f3_tool113:
    # F3_s114 → F3_t115 (new body)
    with BuildSketch(Plane(origin=(-3.9010473932, 6.1390741441, 0), x_dir=(0, 0, 1), z_dir=(-0.5363238526, 0.8440122778, 0))):
        with BuildLine():
            ThreePointArc((0, 6.6104037041), (0.7439487758, 8.4064549283), (2.54, 9.1504037041))
            Line((2.54, 9.1504037041), (0, 9.1504037041))
            Line((0, 9.1504037041), (0, 6.6104037041))
        make_face()
    extrude(amount=F3_T115_DEPTH)

    split(bisect_by=Plane(origin=(-7.9615168729, 8.9710298392, 0), x_dir=(0, 0, 1), z_dir=(0.6637706613, -0.7479361665, 0)), keep=Keep.TOP)


with BuildPart() as f3_tool109_1:
    add(f3_tool109.part)

    # F3_t117: intersect F3_tool113
    add(f3_tool113.part, mode=Mode.INTERSECT)


with BuildPart() as f1_17:
    add(f1_16.part)

    # F3_t107: cut F3_tool109
    add(f3_tool109_1.part, mode=Mode.SUBTRACT)


with BuildPart() as f3_tool120:
    # F3_s121 → F3_t122 (new body)
    with BuildSketch(Plane(origin=(-7.1573309587, -0.3042028783, 0), x_dir=(0, 0, 1), z_dir=(-0.999098, -0.0424639421, 0))):
        with BuildLine():
            ThreePointArc((2.54, 9.1457332978), (0.7439487758, 8.4017845221), (0, 6.6057332978))
            Line((0, 6.6057332978), (0, 9.1457332978))
            Line((0, 9.1457332978), (2.54, 9.1457332978))
        make_face()
    extrude(amount=F3_T122_DEPTH)

    split(bisect_by=Plane(origin=(-11.6443509005, -2.3877180781, 0), x_dir=(0, 0, 1), z_dir=(0.9796170513, 0.2008741718, 0)), keep=Keep.TOP)


with BuildPart() as f3_tool124:
    # F3_s125 → F3_t126 (new body)
    with BuildSketch(Plane(origin=(-12.7115040729, 61.9910764409, 0), x_dir=(0, 0, 1), z_dir=(0.2008741718, -0.9796170513, 0))):
        with BuildLine():
            ThreePointArc((0, 9.3466355844), (0.7439487758, 11.1426868086), (2.54, 11.8866355844))
            Line((2.54, 11.8866355844), (0, 11.8866355844))
            Line((0, 11.8866355844), (0, 9.3466355844))
        make_face()
    extrude(amount=F3_T126_DEPTH)

    split(bisect_by=Plane(origin=(-0.3883638891, 9.1374838465, 0), x_dir=(0, 0, 1), z_dir=(0.0424639421, -0.999098, 0)), keep=Keep.TOP)


with BuildPart() as f3_tool120_1:
    add(f3_tool120.part)

    # F3_t128: intersect F3_tool124
    add(f3_tool124.part, mode=Mode.INTERSECT)


with BuildPart() as f1_18:
    add(f1_17.part)

    # F3_t118: cut F3_tool120
    add(f3_tool120_1.part, mode=Mode.SUBTRACT)


solid = f1_18.part
